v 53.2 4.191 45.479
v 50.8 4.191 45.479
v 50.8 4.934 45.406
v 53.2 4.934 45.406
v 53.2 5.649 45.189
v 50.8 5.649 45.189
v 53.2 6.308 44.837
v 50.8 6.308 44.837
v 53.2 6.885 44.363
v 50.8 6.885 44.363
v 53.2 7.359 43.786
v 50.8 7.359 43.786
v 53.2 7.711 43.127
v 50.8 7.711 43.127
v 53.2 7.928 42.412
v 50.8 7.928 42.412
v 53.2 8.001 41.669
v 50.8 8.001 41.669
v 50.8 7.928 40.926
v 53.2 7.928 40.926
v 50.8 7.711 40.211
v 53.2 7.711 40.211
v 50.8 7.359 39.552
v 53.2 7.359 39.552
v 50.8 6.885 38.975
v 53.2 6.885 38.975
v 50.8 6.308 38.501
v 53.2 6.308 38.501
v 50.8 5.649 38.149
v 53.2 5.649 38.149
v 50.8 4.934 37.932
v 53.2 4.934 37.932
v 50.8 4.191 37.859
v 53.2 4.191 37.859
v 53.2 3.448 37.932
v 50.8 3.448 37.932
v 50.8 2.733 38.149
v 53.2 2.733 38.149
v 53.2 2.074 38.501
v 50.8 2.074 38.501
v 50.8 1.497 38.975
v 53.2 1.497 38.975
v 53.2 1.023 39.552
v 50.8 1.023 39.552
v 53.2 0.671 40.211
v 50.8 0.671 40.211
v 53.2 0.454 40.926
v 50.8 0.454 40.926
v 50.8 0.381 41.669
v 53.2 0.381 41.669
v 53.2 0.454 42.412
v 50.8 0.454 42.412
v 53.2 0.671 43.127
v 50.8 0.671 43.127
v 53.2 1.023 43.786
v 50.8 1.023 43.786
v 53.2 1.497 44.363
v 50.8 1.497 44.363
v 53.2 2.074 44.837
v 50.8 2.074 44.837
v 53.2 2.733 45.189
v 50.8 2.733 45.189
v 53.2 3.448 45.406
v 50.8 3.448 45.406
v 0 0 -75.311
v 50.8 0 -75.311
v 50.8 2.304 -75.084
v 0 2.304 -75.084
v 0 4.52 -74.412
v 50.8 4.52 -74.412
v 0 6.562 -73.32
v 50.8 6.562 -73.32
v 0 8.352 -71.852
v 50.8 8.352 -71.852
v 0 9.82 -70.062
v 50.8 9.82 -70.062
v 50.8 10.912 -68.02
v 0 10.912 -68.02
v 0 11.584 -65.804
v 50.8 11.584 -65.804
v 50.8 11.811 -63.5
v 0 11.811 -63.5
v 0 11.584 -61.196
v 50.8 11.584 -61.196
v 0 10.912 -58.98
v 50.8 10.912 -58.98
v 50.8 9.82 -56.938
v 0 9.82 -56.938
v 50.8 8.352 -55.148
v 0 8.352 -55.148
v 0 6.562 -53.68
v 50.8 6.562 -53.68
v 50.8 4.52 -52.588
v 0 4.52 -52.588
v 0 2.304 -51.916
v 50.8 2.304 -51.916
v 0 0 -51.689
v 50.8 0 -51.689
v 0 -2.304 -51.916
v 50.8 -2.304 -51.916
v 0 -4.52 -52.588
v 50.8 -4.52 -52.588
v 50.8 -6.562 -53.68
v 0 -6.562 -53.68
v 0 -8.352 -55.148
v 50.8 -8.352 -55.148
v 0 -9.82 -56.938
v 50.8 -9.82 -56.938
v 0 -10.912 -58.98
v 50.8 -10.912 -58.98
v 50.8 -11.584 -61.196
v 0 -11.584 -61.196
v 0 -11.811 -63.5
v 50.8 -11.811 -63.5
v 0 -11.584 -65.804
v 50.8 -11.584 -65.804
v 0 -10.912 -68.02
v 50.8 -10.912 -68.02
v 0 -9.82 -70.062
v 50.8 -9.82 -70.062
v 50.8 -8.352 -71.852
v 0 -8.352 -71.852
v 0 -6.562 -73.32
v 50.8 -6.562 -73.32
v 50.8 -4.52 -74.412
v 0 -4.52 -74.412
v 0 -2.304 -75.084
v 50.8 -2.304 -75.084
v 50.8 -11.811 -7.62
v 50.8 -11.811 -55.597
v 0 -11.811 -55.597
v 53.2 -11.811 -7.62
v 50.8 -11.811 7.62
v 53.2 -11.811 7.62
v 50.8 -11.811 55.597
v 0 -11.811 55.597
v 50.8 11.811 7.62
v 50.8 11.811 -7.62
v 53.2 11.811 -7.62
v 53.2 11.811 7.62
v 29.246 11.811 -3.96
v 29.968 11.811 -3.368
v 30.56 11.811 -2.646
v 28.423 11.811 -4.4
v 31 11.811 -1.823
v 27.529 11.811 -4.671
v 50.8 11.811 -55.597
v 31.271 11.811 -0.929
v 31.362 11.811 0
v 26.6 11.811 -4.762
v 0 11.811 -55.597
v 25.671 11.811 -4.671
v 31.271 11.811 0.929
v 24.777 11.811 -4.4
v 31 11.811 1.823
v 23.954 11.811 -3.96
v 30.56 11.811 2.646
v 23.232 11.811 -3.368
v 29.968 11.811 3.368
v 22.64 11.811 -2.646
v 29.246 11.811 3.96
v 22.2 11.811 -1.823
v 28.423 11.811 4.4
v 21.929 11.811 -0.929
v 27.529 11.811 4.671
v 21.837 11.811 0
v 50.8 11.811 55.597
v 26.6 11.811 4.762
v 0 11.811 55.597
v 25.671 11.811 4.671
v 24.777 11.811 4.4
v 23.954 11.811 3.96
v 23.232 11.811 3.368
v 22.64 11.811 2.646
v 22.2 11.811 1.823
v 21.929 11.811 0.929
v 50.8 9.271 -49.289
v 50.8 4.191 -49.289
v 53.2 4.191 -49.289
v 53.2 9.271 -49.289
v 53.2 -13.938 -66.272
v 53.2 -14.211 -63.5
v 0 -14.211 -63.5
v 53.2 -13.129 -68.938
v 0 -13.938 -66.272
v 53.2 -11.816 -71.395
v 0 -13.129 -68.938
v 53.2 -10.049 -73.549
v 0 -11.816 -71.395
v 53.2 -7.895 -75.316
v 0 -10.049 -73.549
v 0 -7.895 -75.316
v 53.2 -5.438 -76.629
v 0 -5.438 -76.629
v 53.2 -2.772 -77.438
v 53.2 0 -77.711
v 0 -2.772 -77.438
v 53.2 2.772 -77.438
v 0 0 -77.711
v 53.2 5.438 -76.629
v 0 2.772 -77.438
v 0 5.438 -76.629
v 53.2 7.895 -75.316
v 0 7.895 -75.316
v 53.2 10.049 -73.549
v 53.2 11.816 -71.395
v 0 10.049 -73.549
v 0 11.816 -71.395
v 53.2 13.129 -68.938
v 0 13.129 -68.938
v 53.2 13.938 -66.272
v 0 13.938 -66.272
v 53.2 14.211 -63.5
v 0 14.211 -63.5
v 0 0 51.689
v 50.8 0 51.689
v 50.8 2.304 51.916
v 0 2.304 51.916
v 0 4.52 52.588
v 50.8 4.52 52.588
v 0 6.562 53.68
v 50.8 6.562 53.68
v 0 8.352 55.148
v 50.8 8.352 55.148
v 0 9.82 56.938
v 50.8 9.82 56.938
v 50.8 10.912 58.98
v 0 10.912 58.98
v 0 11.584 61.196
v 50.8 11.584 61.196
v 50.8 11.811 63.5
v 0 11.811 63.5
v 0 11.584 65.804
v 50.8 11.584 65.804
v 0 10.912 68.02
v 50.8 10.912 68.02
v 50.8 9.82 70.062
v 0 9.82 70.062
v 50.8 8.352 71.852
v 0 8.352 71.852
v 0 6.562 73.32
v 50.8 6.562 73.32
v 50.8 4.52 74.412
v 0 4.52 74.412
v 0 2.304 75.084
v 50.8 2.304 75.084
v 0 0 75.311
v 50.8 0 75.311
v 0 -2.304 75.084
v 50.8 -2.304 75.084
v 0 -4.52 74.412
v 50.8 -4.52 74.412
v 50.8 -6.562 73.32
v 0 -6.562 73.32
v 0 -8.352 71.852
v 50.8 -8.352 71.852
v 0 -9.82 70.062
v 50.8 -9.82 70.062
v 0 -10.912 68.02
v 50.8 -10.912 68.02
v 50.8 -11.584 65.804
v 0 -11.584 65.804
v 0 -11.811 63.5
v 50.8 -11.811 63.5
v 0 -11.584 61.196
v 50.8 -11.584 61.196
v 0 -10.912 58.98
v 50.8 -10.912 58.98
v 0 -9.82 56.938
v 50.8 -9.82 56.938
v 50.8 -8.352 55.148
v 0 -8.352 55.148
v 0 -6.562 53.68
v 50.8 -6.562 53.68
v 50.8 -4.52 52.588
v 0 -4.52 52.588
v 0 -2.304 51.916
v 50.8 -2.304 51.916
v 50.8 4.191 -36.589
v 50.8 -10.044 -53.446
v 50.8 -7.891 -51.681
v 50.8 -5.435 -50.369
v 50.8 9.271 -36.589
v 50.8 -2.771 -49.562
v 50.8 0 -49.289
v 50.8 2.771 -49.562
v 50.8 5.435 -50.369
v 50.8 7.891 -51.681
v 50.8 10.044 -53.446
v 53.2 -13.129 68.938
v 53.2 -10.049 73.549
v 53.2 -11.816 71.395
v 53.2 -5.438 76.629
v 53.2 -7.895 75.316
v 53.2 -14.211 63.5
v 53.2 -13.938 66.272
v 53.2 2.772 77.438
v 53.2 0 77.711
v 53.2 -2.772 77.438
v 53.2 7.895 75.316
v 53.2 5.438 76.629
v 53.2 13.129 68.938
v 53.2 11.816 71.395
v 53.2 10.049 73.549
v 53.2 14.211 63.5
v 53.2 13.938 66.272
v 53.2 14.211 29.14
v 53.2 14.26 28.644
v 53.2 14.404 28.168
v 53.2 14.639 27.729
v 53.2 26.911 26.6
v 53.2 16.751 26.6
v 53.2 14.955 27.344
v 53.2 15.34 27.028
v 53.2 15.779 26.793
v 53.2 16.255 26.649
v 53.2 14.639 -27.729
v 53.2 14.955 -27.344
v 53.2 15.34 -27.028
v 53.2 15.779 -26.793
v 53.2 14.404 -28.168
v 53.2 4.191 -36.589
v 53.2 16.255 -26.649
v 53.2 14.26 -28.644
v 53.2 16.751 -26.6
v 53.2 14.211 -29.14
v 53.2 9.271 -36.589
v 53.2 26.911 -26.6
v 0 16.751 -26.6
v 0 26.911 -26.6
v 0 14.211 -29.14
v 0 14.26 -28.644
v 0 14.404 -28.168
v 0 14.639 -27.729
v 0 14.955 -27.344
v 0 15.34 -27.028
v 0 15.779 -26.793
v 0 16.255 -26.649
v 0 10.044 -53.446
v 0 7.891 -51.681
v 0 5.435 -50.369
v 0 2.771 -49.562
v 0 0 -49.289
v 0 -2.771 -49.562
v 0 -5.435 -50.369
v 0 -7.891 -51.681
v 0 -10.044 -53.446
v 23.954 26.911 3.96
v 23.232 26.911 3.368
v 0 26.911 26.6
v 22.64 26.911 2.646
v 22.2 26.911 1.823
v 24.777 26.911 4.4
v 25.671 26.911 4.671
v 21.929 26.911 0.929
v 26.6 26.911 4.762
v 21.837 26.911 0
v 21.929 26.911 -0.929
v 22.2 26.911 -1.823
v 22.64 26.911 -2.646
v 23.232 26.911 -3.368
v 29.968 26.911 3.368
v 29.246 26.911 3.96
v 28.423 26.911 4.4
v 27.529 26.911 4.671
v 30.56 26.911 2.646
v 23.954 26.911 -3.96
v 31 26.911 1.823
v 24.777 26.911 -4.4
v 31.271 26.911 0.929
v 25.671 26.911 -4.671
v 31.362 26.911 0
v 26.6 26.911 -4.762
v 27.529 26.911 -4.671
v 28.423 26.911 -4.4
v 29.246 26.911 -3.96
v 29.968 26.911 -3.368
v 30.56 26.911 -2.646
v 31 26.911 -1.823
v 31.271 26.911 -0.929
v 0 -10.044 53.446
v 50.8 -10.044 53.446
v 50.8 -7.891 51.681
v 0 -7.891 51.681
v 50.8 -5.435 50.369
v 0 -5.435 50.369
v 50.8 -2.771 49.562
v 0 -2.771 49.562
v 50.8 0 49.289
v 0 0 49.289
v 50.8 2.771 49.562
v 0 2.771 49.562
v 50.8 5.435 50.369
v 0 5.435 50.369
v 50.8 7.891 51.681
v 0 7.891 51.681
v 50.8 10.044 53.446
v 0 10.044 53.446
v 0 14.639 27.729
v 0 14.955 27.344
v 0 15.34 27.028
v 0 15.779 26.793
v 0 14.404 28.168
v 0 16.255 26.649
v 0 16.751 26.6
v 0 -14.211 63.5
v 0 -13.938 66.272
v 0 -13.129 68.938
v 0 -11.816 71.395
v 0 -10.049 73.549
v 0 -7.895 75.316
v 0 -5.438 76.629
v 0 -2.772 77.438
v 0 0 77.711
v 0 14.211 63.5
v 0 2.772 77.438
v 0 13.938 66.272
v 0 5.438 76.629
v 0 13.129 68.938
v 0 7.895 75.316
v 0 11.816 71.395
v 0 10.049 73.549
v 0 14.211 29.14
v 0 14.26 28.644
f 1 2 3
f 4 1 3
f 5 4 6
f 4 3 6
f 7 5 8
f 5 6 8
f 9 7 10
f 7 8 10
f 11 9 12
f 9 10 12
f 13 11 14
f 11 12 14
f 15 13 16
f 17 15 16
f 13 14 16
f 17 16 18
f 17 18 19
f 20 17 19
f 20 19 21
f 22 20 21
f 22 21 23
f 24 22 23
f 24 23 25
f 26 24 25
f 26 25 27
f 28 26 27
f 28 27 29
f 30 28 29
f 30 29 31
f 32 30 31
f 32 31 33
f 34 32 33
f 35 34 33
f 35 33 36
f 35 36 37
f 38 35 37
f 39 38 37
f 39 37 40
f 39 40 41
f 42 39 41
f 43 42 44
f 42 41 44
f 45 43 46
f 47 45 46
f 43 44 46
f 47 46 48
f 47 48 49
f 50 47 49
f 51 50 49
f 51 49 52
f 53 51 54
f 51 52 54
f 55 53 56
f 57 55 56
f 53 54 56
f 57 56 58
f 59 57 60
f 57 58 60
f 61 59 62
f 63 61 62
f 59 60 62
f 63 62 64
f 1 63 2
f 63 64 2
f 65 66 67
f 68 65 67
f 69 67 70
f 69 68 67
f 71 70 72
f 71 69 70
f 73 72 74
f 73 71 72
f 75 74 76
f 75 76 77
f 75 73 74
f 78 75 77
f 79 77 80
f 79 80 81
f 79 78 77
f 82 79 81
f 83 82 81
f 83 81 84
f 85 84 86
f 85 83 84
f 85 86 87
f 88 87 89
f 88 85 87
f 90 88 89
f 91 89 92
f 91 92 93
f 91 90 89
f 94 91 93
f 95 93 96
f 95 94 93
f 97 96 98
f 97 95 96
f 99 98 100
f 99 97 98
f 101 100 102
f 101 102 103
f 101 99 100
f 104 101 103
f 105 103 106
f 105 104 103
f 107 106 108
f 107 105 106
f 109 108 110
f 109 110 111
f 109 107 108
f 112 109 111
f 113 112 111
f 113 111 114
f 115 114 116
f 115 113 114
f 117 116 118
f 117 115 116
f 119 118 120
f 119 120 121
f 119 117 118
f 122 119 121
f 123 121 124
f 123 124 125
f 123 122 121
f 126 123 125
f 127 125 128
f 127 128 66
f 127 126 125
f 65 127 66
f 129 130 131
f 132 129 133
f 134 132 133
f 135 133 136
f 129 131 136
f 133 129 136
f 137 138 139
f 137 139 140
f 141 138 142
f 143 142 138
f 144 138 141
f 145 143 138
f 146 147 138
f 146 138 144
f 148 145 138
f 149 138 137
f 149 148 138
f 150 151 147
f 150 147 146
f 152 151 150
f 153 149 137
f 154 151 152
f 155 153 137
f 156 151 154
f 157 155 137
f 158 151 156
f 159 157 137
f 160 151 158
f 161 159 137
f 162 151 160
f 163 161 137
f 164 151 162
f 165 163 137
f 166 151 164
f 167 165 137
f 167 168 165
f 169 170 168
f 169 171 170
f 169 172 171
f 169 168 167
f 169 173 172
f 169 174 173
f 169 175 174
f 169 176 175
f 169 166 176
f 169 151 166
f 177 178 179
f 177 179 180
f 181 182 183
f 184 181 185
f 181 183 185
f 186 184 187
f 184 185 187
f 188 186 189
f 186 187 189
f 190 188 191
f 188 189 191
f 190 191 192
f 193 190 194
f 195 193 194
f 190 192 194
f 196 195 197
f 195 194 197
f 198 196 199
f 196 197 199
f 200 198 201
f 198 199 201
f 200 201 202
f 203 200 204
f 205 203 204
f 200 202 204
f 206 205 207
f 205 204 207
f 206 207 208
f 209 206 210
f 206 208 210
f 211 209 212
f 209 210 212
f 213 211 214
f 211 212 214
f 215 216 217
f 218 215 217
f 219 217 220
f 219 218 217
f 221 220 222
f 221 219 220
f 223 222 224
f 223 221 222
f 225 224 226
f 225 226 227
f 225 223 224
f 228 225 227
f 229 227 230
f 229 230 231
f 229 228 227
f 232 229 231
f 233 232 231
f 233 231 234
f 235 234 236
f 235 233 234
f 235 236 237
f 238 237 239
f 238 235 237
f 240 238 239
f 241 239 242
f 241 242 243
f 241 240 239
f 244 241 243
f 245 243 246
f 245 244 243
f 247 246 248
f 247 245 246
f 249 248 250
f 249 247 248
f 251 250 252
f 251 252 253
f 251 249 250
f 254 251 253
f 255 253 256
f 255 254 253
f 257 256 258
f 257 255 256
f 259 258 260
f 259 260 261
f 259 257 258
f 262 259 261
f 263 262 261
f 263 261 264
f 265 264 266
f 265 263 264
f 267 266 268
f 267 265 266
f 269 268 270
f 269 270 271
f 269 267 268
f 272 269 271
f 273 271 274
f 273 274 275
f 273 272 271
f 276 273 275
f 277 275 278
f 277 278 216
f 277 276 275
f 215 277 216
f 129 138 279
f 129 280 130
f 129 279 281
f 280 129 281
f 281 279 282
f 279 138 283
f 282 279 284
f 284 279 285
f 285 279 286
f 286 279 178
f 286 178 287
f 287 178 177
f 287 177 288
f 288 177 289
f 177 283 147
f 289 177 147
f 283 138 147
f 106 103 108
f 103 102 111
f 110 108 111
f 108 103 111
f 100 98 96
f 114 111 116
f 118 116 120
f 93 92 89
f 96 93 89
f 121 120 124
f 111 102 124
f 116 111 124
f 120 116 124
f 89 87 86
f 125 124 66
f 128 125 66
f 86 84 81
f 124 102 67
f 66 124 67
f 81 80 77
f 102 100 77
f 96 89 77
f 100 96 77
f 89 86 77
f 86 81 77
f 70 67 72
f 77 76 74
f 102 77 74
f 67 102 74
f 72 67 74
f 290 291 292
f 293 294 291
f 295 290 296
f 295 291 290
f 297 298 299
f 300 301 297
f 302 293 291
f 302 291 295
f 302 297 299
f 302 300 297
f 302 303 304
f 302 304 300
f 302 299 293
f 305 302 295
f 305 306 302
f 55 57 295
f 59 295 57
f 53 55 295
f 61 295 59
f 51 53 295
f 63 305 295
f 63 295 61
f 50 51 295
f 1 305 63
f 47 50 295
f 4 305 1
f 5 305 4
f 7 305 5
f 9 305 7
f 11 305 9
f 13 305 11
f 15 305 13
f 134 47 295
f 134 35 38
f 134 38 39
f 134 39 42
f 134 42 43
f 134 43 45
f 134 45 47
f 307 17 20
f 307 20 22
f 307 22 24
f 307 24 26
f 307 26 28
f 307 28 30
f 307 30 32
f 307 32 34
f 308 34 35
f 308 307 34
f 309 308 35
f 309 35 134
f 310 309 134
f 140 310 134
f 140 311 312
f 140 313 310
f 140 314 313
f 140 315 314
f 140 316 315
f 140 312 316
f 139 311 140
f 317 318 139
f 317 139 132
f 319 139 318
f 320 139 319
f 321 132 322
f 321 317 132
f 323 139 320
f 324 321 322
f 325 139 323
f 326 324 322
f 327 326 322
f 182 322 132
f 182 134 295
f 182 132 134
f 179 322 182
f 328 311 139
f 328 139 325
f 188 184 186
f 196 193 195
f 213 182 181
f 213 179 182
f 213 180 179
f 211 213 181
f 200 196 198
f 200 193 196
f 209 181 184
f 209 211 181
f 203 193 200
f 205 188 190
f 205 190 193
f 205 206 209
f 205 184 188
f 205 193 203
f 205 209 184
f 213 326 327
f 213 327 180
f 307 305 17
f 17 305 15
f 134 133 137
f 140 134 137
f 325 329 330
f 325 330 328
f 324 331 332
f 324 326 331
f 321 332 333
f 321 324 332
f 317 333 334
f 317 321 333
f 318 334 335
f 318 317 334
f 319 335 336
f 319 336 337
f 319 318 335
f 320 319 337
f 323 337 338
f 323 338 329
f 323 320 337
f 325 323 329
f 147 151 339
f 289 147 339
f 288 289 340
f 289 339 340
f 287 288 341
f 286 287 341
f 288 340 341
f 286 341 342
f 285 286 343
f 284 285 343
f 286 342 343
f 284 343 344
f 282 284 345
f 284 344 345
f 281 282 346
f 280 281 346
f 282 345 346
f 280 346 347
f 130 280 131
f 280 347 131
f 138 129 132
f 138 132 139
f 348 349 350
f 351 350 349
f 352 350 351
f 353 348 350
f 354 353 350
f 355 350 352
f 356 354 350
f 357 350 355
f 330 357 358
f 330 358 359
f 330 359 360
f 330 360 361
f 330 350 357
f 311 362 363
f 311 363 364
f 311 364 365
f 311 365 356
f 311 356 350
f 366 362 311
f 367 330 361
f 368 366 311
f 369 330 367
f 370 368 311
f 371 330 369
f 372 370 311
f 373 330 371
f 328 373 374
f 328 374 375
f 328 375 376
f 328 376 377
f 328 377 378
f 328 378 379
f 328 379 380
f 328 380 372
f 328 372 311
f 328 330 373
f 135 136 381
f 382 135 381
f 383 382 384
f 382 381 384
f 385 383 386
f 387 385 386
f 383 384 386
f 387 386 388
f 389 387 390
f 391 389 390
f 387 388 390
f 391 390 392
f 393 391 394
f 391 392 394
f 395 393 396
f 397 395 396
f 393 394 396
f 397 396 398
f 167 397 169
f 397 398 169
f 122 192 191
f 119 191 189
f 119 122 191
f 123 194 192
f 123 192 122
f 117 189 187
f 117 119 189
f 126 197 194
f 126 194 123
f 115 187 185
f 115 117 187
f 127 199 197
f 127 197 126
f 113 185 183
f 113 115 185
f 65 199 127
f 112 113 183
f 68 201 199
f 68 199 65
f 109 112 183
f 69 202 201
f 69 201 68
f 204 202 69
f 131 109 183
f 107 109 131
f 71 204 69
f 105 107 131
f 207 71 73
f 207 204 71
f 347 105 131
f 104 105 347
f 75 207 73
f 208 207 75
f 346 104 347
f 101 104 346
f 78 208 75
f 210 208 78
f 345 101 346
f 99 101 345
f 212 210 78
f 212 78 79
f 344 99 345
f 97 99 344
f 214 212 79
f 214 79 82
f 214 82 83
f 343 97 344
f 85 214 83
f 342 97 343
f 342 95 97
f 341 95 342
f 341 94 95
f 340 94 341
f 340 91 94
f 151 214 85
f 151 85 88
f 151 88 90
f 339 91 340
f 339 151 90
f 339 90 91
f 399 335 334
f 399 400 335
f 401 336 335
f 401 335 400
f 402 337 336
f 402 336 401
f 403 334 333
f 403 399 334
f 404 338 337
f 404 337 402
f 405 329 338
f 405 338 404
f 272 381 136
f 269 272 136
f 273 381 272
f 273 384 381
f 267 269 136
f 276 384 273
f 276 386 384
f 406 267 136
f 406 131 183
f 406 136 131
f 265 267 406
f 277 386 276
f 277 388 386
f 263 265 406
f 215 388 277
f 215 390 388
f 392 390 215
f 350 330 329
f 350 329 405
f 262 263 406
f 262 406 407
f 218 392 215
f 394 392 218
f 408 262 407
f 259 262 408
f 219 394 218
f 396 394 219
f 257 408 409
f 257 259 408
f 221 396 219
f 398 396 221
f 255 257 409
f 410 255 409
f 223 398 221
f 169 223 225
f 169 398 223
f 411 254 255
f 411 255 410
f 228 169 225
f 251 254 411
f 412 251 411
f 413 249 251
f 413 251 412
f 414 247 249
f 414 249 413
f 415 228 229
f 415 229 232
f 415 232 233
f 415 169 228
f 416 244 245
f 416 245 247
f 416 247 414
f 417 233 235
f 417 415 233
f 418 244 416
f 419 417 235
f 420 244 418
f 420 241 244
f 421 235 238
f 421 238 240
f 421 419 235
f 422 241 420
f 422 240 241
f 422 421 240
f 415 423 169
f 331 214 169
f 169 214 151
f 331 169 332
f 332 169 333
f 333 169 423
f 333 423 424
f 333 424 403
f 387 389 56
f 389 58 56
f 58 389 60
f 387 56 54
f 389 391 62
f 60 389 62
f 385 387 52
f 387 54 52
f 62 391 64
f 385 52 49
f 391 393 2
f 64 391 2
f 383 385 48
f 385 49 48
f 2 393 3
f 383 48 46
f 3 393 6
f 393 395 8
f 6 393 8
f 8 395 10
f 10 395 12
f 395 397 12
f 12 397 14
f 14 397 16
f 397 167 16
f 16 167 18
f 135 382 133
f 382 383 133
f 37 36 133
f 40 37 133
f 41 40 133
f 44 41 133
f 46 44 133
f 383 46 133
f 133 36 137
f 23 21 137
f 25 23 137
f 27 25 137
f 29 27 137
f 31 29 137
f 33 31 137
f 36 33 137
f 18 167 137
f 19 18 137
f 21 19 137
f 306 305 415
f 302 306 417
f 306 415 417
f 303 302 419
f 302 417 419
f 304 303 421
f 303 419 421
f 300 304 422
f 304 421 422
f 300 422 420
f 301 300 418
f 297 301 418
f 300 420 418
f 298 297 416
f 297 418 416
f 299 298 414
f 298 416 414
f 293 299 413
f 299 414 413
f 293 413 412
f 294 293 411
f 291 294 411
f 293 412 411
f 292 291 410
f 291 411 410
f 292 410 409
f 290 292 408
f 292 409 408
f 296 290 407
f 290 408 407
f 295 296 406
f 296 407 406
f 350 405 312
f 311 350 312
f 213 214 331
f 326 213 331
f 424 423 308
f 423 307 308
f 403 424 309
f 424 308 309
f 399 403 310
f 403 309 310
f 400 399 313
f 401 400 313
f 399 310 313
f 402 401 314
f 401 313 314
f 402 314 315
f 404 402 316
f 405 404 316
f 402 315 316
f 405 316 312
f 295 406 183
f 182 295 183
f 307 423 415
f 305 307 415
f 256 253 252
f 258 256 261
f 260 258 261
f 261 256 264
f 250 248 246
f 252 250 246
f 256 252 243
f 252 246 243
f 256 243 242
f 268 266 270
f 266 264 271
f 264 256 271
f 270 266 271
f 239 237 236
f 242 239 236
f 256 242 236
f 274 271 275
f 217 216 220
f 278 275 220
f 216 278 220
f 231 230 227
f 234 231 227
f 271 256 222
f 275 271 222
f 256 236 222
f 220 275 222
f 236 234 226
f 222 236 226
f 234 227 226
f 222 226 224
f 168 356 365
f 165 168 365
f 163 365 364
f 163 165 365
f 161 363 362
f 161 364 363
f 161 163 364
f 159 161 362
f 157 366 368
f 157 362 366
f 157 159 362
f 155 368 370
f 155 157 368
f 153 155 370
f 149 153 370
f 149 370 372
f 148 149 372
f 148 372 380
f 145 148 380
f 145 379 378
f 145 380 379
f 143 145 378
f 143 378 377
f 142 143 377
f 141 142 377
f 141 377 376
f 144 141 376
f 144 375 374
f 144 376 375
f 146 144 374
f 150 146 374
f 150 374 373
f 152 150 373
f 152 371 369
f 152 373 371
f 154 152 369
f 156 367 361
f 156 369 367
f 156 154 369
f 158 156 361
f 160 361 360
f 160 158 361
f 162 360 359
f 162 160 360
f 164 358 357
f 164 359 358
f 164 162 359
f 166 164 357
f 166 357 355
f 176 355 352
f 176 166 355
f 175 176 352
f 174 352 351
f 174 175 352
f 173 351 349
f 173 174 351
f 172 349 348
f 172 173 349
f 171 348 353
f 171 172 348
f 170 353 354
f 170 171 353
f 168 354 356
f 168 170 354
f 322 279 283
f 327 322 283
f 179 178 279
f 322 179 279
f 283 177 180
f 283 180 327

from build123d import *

# Parameters (mm, degrees)
SKETCH1_R               = 11.811
BOSS_EXTRUDE1_DEPTH     = 50.8
BOSS_EXTRUDE2_DEPTH     = 2.399999772
SKETCH5_R               = 3.81
SKETCH5_W               = 12.7
SKETCH5_H               = 5.08
SKETCH5_W_2             = 15.24
SKETCH5_H_2             = 23.622
CUT_EXTRUDE3_DEPTH      = 3.81
SKETCH8_W               = 53.199999772
SKETCH8_H               = 53.199999772
BOSS_EXTRUDE3_DEPTH     = 12.7
CUT_EXTRUDE5_DEPTH      = 99.371995605
CUT_EXTRUDE5_DEPTH_BACK = 3.81
SKETCH6_R               = 4.7625
FILLET1_R               = 2.54


with BuildPart() as part:
    # Sketch1 → Boss-Extrude1 (new body)
    with BuildSketch(Plane(origin=(0, 0, 0), x_dir=(0, 0, -1), z_dir=(1, 0, 0))):
        with BuildLine():
            Line((-63.5, 14.210999772), (63.5, 14.210999772))
            ThreePointArc((63.5, 14.210999772), (77.710999772, 0), (63.5, -14.210999772))
            Line((63.5, -14.210999772), (-63.5, -14.210999772))
            ThreePointArc((-63.5, -14.210999772), (-77.710999772, 0), (-63.5, 14.210999772))
        make_face()
        with Locations((-63.5, 0)):
            Circle(SKETCH1_R, mode=Mode.SUBTRACT)
        with Locations((63.5, 0)):
            Circle(SKETCH1_R, mode=Mode.SUBTRACT)
        with BuildLine():
            Line((-55.597292014, 11.811), (55.597292014, 11.811))
            ThreePointArc((55.597292014, 11.811), (49.289000228, 0), (55.597292014, -11.811))
            Line((55.597292014, -11.811), (-55.597292014, -11.811))
            ThreePointArc((-55.597292014, -11.811), (-49.289000228, 0), (-55.597292014, 11.811))
        make_face(mode=Mode.SUBTRACT)
    extrude(amount=BOSS_EXTRUDE1_DEPTH)

    # Sketch2 → Boss-Extrude2 (add)
    with BuildSketch(Plane(origin=(50.8, 0, 0), x_dir=(0, 0, -1), z_dir=(1, 0, 0))):
        with BuildLine():
            Line((-63.5, -14.210999772), (63.5, -14.210999772))
            ThreePointArc((63.5, -14.210999772), (77.710999772, 0), (63.5, 14.210999772))
            Line((63.5, 14.210999772), (-63.5, 14.210999772))
            ThreePointArc((-63.5, 14.210999772), (-77.710999772, 0), (-63.5, -14.210999772))
        make_face()
    extrude(amount=BOSS_EXTRUDE2_DEPTH)

    # Sketch5 → Cut-Extrude3 (cut)
    with BuildSketch(Plane.ZY.offset(-50.8)):
        with Locations((41.669000228, 4.191)):
            Circle(SKETCH5_R)
        with Locations((-42.939000228, 6.731)):
            Rectangle(SKETCH5_W, SKETCH5_H)
        Rectangle(SKETCH5_W_2, SKETCH5_H_2)
    extrude(amount=-CUT_EXTRUDE3_DEPTH, mode=Mode.SUBTRACT)

    # Sketch8 → Boss-Extrude3 (add)
    with BuildSketch(Plane(origin=(0, 14.210999772, 0), x_dir=(1, 0, 0), z_dir=(0, 1, 0))):
        with Locations((26.599999886, 0)):
            Rectangle(SKETCH8_W, SKETCH8_H)
    extrude(amount=BOSS_EXTRUDE3_DEPTH)

    # Sketch6 → Cut-Extrude5 (cut, two sides: drawn at the far end of the back side and taken through both)
    with BuildSketch(Plane(origin=(0, 14.210999772, 0), x_dir=(1, 0, 0), z_dir=(0, 1, 0)).offset(-CUT_EXTRUDE5_DEPTH_BACK)):
        with Locations(Location((26.599999886, 0, 0), (0, 0, 270))):
            Circle(SKETCH6_R)
    extrude(amount=CUT_EXTRUDE5_DEPTH + CUT_EXTRUDE5_DEPTH_BACK, mode=Mode.SUBTRACT)

    # Fillet1
    fillet1_edges = [part.edges().sort_by_distance(p)[0] for p in [
        (26.599999886, 14.210999772, 26.599999886),
        (26.599999886, 14.210999772, -26.599999886),
    ]]
    fillet(fillet1_edges, radius=FILLET1_R)


solid = part.part
